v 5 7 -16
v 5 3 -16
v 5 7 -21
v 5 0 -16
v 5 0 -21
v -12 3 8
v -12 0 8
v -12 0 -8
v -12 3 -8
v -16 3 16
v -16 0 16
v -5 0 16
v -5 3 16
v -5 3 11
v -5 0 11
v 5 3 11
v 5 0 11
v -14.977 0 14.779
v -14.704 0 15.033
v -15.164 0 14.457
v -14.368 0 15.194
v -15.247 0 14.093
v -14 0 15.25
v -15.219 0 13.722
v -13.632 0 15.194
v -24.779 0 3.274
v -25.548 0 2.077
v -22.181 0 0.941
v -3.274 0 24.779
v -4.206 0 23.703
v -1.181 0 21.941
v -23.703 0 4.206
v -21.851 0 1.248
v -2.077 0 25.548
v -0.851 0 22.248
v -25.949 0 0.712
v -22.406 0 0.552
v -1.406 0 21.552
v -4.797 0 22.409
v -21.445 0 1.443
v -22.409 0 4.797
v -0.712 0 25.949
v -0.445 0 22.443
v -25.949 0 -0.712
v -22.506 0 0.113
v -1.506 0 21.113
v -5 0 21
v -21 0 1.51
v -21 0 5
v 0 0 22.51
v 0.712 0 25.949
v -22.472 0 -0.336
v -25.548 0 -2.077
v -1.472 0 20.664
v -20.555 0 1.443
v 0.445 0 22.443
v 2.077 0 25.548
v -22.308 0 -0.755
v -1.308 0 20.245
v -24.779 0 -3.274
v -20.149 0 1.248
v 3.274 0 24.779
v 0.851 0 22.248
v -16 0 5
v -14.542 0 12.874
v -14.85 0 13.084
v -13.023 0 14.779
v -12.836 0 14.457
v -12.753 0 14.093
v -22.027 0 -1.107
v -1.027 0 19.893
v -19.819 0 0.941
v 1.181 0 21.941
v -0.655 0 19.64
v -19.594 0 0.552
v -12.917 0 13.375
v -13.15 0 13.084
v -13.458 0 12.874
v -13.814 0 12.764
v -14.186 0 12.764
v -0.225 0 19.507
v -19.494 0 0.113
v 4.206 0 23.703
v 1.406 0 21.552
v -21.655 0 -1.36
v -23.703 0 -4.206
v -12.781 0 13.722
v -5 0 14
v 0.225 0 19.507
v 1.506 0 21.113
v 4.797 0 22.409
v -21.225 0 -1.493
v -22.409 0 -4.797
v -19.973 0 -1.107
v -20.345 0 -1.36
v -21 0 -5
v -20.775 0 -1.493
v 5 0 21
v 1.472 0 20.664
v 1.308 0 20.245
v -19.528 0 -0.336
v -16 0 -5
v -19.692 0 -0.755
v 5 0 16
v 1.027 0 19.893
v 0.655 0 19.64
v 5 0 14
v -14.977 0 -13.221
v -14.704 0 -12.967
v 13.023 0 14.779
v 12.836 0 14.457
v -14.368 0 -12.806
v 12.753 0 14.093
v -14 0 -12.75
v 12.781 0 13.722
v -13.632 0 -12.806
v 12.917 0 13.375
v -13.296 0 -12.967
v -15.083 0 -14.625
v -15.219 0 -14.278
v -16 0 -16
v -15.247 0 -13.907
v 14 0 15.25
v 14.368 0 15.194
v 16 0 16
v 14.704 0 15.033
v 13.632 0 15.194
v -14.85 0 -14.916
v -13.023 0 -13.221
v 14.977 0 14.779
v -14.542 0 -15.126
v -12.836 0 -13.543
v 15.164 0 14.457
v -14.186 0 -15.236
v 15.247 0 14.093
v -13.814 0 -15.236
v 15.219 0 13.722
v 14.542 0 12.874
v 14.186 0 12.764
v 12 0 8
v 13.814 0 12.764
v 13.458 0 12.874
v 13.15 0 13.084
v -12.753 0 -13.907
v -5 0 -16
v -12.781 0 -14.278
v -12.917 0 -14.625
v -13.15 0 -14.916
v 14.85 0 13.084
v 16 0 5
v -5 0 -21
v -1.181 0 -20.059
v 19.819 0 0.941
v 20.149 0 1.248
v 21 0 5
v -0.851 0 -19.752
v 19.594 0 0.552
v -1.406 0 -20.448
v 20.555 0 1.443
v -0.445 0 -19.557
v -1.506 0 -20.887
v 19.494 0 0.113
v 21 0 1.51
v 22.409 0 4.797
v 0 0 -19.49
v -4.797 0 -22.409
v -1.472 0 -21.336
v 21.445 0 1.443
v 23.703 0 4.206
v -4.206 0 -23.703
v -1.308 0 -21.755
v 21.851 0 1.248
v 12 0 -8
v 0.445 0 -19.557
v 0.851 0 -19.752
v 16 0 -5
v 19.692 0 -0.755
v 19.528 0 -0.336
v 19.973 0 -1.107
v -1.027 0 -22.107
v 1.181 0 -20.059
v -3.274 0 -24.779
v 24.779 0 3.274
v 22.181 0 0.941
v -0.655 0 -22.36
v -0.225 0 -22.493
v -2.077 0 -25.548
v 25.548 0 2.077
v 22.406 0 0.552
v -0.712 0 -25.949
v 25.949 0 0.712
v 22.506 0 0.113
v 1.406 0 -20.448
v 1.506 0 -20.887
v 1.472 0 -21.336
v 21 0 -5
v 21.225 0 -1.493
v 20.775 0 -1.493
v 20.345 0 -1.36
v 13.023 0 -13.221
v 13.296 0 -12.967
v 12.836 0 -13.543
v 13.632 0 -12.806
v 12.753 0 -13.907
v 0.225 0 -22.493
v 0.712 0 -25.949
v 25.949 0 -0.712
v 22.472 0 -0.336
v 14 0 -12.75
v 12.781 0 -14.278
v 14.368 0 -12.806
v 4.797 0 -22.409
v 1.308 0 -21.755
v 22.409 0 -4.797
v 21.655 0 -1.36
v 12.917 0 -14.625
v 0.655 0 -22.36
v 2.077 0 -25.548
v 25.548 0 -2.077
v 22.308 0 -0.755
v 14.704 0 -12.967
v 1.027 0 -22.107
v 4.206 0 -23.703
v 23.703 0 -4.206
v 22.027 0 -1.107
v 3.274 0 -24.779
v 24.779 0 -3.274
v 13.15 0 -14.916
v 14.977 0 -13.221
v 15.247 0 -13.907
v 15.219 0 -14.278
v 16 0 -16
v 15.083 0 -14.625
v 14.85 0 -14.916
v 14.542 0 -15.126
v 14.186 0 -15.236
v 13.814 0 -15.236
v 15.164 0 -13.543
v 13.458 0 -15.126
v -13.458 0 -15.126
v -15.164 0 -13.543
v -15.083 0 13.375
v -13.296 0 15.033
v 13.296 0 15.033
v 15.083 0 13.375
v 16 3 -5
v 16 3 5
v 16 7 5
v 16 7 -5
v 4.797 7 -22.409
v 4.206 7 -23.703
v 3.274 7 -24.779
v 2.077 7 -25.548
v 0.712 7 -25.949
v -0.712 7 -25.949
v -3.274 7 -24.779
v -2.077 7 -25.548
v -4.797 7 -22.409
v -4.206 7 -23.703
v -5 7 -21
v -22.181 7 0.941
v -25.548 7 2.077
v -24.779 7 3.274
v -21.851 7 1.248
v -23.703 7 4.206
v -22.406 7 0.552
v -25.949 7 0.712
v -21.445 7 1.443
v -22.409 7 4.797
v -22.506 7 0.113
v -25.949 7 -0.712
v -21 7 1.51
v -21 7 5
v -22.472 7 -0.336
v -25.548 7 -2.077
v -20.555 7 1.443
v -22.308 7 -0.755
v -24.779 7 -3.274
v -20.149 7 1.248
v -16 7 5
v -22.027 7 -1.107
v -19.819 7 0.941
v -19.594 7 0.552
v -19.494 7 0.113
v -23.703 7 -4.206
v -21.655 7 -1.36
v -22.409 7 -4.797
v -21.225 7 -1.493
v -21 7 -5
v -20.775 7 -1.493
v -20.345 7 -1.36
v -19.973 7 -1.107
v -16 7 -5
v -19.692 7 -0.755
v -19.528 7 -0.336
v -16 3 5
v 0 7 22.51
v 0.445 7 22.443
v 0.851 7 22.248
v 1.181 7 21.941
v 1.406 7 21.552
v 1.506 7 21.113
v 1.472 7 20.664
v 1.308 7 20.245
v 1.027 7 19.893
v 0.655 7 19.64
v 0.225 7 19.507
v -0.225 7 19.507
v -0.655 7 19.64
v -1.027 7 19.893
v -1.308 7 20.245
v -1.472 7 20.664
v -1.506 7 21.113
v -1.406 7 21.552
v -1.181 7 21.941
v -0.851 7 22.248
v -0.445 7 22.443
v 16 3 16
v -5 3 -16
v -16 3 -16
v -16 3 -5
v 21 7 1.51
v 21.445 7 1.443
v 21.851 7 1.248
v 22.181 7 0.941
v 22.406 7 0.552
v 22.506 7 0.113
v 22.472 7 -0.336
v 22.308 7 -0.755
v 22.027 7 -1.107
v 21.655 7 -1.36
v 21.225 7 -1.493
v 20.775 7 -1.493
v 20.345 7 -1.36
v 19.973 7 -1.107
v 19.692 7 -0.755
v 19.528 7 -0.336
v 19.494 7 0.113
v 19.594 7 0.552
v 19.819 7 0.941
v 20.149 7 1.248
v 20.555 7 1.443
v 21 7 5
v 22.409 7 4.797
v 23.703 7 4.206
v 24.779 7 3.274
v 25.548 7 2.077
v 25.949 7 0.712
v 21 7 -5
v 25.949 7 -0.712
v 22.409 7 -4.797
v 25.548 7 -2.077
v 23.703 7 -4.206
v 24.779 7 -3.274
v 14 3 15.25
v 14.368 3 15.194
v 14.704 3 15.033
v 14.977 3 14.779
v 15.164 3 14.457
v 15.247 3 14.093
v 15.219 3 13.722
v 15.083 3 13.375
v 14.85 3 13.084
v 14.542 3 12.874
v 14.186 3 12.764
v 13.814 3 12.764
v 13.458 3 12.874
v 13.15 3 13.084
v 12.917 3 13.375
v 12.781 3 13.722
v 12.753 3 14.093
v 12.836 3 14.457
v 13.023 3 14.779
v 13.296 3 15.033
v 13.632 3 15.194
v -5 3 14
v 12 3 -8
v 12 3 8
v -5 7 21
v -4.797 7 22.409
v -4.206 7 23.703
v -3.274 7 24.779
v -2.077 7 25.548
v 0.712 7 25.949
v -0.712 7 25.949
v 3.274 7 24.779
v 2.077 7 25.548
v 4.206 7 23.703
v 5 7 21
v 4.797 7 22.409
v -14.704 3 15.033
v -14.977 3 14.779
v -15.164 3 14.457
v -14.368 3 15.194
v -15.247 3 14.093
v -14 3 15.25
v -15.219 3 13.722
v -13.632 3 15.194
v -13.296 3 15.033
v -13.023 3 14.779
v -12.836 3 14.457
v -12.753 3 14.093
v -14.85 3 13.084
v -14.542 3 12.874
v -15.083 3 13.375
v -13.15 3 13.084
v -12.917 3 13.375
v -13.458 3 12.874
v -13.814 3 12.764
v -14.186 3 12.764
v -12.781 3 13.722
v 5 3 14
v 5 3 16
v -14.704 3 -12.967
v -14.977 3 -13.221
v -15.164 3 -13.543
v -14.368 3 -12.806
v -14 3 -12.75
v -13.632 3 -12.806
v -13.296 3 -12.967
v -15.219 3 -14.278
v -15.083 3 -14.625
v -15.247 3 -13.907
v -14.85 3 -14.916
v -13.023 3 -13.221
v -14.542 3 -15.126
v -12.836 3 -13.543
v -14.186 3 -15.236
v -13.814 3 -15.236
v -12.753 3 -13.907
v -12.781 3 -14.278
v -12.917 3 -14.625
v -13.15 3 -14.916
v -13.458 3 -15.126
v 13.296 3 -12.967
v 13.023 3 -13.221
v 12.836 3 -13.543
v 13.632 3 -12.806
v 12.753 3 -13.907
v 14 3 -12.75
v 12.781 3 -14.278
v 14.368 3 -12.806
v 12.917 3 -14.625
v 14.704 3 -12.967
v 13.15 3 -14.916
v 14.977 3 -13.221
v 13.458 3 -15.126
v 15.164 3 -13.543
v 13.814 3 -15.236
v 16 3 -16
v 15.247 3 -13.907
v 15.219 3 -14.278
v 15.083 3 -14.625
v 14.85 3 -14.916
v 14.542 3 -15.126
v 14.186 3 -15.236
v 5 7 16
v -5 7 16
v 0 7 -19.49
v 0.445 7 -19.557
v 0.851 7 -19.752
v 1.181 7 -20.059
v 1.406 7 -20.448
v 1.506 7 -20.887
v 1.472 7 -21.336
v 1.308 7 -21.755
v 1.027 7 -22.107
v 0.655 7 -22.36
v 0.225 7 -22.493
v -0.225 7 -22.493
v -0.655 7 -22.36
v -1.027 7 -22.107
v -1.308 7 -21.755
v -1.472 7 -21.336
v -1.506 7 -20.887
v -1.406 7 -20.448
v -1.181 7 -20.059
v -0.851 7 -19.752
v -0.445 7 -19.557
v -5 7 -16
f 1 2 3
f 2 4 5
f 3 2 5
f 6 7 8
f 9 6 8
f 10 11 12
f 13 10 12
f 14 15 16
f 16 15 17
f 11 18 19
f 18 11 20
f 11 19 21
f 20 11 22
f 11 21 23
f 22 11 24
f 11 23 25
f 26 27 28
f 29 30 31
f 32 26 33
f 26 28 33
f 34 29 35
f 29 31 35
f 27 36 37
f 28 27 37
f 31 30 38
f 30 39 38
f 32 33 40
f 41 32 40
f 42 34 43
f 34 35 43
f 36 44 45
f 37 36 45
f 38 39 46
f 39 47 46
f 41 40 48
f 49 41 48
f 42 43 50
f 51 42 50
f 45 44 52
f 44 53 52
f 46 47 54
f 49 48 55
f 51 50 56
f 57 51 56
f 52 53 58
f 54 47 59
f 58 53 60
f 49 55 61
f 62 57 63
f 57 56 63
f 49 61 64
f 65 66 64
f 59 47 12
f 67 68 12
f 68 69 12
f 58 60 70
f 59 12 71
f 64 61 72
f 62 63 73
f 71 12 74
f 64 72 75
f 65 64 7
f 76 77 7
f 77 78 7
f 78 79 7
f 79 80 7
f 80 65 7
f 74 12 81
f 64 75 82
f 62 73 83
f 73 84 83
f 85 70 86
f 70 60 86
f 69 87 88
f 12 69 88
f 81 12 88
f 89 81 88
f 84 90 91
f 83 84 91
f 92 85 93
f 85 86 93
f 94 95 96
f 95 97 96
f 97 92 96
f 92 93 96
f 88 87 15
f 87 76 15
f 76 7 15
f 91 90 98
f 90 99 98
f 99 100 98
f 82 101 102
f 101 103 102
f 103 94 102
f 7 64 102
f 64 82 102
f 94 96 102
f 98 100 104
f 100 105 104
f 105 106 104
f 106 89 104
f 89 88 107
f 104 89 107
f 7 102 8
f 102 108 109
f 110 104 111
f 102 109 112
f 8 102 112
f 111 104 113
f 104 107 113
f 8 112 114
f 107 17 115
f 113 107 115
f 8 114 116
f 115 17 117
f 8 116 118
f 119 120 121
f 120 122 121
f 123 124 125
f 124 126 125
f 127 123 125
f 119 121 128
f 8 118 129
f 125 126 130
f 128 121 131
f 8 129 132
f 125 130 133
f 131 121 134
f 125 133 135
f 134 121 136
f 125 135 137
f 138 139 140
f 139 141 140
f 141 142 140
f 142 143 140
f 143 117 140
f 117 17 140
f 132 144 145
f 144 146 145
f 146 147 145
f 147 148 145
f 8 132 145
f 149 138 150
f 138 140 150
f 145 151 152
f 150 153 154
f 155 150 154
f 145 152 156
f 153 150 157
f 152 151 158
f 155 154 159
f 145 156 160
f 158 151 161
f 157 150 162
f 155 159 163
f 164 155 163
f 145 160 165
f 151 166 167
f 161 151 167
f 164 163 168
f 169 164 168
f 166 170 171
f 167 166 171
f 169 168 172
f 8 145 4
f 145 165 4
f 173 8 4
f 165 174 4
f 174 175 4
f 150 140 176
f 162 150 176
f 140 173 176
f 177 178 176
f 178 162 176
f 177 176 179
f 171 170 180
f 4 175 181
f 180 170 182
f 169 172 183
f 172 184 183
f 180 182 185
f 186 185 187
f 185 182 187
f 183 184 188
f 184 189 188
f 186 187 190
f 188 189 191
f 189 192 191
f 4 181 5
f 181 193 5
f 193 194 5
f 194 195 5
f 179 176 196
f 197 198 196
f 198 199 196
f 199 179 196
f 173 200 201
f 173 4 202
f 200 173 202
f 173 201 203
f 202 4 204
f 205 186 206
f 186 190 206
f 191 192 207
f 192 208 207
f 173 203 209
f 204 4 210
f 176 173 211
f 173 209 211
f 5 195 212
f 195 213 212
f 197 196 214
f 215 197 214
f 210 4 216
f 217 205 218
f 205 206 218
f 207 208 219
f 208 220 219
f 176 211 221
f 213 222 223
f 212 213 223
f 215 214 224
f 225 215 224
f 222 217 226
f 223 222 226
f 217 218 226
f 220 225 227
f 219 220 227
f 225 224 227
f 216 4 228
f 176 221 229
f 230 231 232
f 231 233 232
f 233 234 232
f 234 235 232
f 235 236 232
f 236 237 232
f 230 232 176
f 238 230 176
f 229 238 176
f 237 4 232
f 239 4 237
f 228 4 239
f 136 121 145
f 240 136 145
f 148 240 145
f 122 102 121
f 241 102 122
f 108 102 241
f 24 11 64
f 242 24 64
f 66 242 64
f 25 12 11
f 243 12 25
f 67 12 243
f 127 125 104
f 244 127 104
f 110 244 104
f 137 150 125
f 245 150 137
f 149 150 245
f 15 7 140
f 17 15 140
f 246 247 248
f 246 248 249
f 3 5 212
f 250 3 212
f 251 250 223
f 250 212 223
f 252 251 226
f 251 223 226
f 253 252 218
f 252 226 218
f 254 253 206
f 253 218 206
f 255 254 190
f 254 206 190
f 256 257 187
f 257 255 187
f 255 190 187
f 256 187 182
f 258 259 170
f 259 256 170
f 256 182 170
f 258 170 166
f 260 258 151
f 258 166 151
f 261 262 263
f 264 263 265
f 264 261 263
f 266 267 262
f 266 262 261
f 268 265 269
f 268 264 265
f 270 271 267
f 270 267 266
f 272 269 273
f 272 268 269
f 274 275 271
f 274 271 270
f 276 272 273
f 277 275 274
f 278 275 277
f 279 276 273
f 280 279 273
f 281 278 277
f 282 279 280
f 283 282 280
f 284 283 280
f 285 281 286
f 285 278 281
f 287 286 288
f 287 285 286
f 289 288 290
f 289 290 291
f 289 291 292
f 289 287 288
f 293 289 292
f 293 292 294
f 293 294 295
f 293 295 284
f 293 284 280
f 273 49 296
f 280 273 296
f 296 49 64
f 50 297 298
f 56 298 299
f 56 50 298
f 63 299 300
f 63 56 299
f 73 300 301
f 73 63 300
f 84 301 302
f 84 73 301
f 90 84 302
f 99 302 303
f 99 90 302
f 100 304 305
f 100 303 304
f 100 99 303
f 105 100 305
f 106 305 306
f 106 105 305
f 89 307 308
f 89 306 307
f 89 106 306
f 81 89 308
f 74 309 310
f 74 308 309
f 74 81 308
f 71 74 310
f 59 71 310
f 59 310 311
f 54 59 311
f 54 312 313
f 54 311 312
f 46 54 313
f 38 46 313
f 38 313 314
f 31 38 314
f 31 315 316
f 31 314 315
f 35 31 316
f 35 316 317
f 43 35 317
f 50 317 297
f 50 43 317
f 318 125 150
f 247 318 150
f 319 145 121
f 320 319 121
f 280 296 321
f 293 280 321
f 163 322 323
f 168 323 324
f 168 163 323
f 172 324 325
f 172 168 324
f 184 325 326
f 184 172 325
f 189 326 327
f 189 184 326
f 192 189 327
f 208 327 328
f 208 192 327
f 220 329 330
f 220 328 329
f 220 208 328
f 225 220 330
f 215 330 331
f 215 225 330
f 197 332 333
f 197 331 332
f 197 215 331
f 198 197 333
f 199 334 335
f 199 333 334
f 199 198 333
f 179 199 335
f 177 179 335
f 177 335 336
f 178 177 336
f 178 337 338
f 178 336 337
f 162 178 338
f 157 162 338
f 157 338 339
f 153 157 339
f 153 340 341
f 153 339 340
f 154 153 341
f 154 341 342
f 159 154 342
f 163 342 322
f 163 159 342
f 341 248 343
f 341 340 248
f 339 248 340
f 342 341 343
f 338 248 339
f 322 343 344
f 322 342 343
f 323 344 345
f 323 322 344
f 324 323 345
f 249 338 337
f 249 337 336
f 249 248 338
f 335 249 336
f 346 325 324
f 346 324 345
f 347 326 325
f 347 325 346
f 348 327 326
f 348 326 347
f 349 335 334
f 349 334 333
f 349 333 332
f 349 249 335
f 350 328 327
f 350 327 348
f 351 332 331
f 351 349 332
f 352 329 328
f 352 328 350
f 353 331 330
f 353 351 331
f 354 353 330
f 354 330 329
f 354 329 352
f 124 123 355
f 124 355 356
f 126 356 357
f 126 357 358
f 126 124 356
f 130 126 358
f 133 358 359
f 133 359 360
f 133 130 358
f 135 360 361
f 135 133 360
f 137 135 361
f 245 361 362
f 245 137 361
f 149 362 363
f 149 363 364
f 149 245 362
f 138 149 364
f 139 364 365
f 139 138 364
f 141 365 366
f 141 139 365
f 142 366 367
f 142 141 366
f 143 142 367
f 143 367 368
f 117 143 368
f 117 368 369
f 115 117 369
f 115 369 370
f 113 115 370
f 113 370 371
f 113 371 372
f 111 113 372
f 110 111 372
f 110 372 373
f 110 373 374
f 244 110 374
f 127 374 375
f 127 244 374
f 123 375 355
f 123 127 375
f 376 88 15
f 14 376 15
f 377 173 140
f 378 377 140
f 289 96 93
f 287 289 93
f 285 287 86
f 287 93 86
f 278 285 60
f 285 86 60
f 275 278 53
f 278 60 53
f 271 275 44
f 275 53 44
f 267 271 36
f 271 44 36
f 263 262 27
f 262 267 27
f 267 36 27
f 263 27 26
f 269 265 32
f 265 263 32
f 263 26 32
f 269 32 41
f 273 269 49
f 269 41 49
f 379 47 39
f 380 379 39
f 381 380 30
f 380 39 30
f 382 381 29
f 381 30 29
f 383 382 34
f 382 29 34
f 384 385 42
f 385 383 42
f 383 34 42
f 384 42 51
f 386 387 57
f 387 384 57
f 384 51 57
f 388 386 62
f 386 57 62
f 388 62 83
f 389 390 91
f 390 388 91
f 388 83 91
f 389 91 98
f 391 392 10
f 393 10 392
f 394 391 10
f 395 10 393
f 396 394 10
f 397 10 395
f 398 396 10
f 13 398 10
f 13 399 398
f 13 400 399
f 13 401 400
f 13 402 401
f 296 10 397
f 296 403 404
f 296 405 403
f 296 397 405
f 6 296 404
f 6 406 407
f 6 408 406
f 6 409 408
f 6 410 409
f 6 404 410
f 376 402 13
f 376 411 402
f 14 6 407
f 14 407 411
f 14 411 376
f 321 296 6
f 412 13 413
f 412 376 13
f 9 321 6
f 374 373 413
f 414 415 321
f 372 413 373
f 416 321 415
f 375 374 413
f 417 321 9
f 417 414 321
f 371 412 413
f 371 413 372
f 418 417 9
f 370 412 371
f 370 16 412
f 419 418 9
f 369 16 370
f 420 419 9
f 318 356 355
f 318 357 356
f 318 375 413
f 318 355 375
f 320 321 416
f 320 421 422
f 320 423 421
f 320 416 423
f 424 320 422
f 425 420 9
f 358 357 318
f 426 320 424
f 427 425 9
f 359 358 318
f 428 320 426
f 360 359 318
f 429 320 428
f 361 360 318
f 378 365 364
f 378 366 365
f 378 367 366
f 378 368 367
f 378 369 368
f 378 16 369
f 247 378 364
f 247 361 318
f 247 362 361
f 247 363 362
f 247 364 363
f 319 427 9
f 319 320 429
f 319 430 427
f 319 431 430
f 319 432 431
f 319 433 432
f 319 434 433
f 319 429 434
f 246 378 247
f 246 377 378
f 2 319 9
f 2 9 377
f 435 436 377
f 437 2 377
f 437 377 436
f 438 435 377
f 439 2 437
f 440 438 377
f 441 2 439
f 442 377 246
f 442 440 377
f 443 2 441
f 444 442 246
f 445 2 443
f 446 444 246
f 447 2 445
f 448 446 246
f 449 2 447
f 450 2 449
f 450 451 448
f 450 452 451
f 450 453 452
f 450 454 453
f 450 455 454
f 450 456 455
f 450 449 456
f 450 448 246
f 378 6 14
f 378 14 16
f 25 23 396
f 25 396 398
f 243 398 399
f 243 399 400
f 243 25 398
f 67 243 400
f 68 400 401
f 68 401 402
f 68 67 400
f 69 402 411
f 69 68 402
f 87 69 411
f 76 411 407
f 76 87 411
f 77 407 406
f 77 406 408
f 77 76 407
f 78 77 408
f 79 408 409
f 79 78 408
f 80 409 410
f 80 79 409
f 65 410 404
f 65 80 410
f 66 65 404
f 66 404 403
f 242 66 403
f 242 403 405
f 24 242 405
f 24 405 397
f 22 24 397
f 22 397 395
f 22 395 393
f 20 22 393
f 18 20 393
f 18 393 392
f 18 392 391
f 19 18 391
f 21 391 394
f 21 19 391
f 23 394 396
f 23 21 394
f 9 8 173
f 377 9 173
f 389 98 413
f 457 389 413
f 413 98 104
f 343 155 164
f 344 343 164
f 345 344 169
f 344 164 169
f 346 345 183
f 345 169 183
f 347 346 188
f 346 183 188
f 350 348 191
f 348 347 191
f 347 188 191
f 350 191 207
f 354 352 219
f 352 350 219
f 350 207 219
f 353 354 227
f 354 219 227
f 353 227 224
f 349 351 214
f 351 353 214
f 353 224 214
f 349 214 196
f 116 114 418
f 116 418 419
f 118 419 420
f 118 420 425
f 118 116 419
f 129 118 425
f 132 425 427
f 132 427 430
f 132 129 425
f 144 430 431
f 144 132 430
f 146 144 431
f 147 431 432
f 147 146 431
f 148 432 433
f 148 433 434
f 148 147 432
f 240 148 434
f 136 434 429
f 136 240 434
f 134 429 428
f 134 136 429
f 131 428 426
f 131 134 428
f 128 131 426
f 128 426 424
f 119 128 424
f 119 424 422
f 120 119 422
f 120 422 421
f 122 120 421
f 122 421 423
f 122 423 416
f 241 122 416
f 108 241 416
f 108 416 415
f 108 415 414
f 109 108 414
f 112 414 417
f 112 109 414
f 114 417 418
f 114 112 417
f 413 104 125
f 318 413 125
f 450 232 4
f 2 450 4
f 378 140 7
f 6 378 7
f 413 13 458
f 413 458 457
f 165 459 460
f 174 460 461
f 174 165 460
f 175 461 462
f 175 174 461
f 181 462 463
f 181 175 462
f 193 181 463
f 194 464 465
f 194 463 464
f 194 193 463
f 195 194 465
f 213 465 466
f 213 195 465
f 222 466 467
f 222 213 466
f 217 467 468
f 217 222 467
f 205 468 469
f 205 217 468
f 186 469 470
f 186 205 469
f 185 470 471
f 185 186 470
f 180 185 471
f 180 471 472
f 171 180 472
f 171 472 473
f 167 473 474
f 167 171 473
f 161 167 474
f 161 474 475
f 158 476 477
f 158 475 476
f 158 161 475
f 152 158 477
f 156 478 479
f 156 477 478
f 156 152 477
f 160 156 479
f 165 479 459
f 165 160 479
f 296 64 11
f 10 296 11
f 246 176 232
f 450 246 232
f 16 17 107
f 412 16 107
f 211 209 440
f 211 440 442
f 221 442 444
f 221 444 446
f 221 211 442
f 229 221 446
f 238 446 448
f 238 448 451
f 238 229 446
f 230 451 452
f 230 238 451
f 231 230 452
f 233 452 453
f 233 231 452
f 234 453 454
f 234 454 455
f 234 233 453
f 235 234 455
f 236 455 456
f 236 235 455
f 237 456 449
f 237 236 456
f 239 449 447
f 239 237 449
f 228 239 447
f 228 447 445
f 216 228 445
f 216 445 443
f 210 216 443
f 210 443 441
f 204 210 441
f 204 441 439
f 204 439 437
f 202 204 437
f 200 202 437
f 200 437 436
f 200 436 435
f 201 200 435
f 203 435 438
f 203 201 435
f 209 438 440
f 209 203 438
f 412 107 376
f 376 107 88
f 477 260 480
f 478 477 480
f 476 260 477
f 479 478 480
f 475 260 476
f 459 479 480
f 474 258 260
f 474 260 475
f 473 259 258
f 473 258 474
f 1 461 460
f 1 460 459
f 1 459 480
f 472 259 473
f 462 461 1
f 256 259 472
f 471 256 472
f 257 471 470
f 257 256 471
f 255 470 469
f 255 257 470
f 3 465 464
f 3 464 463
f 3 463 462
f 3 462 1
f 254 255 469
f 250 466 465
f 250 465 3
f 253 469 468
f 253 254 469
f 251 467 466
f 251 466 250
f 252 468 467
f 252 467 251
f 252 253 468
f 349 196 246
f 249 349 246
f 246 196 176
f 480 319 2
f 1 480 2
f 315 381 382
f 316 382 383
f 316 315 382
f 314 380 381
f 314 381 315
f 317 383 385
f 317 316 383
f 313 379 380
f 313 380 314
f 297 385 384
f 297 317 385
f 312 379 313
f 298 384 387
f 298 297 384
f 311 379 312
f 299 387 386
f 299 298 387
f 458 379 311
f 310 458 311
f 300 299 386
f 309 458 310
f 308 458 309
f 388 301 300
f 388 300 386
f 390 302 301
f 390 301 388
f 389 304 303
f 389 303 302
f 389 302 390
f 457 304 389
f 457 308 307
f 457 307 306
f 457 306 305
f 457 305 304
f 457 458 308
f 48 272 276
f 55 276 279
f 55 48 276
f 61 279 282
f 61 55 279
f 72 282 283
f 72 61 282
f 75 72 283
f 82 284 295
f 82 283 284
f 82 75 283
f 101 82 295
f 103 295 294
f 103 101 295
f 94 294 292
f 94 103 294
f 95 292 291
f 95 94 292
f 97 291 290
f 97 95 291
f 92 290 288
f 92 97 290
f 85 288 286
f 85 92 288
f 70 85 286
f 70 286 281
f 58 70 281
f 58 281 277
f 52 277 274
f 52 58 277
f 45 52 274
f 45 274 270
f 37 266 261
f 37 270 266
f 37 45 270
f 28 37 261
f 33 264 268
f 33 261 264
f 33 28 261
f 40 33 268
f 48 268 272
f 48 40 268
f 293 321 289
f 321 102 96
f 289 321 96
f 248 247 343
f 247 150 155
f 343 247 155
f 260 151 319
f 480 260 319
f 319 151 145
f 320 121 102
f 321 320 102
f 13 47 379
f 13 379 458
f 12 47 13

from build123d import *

# Parameters (mm, degrees)
SKETCH_2_R          = 1.25
SKETCH_2_R_2        = 1.51
EXTRUDE_1_DEPTH     = 3
SKETCH_4_R          = 1.51
EXTRUDE_2_DEPTH     = 4.5
SKETCH_5_R          = 1.51
EXTRUDE_3_DEPTH     = 4.5
SKETCH_7_W          = 94.013150519
SKETCH_7_H          = 65.926721802
CUT_EXTRUDE_1_DEPTH = 0.5


with BuildPart() as part:
    # 草图2 → 凸台-拉伸1 (new body)
    with BuildSketch(Plane(origin=(0, 0, 0), x_dir=(1, 0, 0), z_dir=(0, 1, 0))):
        with BuildLine():
            Line((21, 5), (16, 5))
            Line((16, 5), (16, 16))
            Line((16, 16), (5, 16))
            Line((5, 16), (5, 21))
            ThreePointArc((5, 21), (0, 26), (-5, 21))
            Line((-5, 21), (-5, 16))
            Line((-5, 16), (-16, 16))
            Line((-16, 16), (-16, 5))
            Line((-16, 5), (-21, 5))
            ThreePointArc((-21, 5), (-26, 0), (-21, -5))
            Line((-21, -5), (-16, -5))
            Line((-16, -5), (-16, -16))
            Line((-16, -16), (-5, -16))
            Line((-5, -16), (-5, -21))
            ThreePointArc((-5, -21), (0, -26), (5, -21))
            Line((5, -21), (5, -16))
            Line((5, -16), (16, -16))
            Line((16, -16), (16, -5))
            Line((16, -5), (21, -5))
            ThreePointArc((21, -5), (26, 0), (21, 5))
        make_face()
        with Locations(Location((-14, 14, 0), (0, 0, 270))):
            Circle(SKETCH_2_R, mode=Mode.SUBTRACT)
        with Locations(Location((14, 14, 0), (0, 0, 270))):
            Circle(SKETCH_2_R, mode=Mode.SUBTRACT)
        with Locations(Location((14, -14, 0), (0, 0, 270))):
            Circle(SKETCH_2_R, mode=Mode.SUBTRACT)
        with Locations(Location((-14, -14, 0), (0, 0, 270))):
            Circle(SKETCH_2_R, mode=Mode.SUBTRACT)
        with Locations(Location((21, 0, 0), (0, 0, 270))):
            Circle(SKETCH_2_R_2, mode=Mode.SUBTRACT)
        with Locations(Location((0, 21, 0), (0, 0, 270))):
            Circle(SKETCH_2_R_2, mode=Mode.SUBTRACT)
        with Locations(Location((0, -21, 0), (0, 0, 270))):
            Circle(SKETCH_2_R_2, mode=Mode.SUBTRACT)
        with Locations(Location((-21, 0, 0), (0, 0, 270))):
            Circle(SKETCH_2_R_2, mode=Mode.SUBTRACT)
        Polygon((-12, 0), (-12, 8), (12, 8), (12, 0), (12, -8), (-12, -8), align=None, mode=Mode.SUBTRACT)
        Polygon((0, -11), (5, -11), (5, -14), (0, -14), (-5, -14), (-5, -11), align=None, mode=Mode.SUBTRACT)
    extrude(amount=EXTRUDE_1_DEPTH)

    # 草图4 → 凸台-拉伸2 (add)
    with BuildSketch(Plane(origin=(0, 3, 0), x_dir=(1, 0, 0), z_dir=(0, 1, 0))):
        with BuildLine():
            Line((-16, -5), (-16, 5))
            Line((-16, 5), (-21, 5))
            ThreePointArc((-21, 5), (-26, 0), (-21, -5))
            Line((-21, -5), (-16, -5))
        make_face()
        with Locations(Location((-21, 0, 0), (0, 0, 270))):
            Circle(SKETCH_4_R, mode=Mode.SUBTRACT)
    extrude(amount=EXTRUDE_2_DEPTH)

    # 草图5 → 凸台-拉伸3 (add)
    # profile 1 of 3: a face of its own
    with BuildSketch(Plane(origin=(0, 3, 0), x_dir=(1, 0, 0), z_dir=(0, 1, 0))):
        with BuildLine():
            Line((-5, 16), (5, 16))
            Line((5, 16), (5, 21))
            ThreePointArc((5, 21), (0, 26), (-5, 21))
            Line((-5, 21), (-5, 16))
        make_face()
        with Locations(Location((0, 21, 0), (0, 0, 270))):
            Circle(SKETCH_5_R, mode=Mode.SUBTRACT)
    # profile 2 of 3: a face of its own
    with BuildSketch(Plane(origin=(0, 3, 0), x_dir=(1, 0, 0), z_dir=(0, 1, 0))):
        with BuildLine():
            Line((16, -5), (16, 5))
            Line((16, 5), (21, 5))
            ThreePointArc((21, 5), (26, 0), (21, -5))
            Line((21, -5), (16, -5))
        make_face()
        with Locations(Location((21, 0, 0), (0, 0, 270))):
            Circle(SKETCH_5_R, mode=Mode.SUBTRACT)
    # profile 3 of 3: a face of its own
    with BuildSketch(Plane(origin=(0, 3, 0), x_dir=(1, 0, 0), z_dir=(0, 1, 0))):
        with BuildLine():
            Line((-5, -16), (5, -16))
            Line((5, -16), (5, -21))
            ThreePointArc((5, -21), (0, -26), (-5, -21))
            Line((-5, -21), (-5, -16))
        make_face()
        with Locations(Location((0, -21, 0), (0, 0, 270))):
            Circle(SKETCH_5_R, mode=Mode.SUBTRACT)
    extrude(amount=EXTRUDE_3_DEPTH)

    # 草图7 → 切除-拉伸1 (cut)
    with BuildSketch(Plane(origin=(0, 7.5, 0), x_dir=(1, 0, 0), z_dir=(0, 1, 0))):
        with Locations((4.289349993, -0.293791095)):
            Rectangle(SKETCH_7_W, SKETCH_7_H)
    extrude(amount=-CUT_EXTRUDE_1_DEPTH, mode=Mode.SUBTRACT)


solid = part.part
